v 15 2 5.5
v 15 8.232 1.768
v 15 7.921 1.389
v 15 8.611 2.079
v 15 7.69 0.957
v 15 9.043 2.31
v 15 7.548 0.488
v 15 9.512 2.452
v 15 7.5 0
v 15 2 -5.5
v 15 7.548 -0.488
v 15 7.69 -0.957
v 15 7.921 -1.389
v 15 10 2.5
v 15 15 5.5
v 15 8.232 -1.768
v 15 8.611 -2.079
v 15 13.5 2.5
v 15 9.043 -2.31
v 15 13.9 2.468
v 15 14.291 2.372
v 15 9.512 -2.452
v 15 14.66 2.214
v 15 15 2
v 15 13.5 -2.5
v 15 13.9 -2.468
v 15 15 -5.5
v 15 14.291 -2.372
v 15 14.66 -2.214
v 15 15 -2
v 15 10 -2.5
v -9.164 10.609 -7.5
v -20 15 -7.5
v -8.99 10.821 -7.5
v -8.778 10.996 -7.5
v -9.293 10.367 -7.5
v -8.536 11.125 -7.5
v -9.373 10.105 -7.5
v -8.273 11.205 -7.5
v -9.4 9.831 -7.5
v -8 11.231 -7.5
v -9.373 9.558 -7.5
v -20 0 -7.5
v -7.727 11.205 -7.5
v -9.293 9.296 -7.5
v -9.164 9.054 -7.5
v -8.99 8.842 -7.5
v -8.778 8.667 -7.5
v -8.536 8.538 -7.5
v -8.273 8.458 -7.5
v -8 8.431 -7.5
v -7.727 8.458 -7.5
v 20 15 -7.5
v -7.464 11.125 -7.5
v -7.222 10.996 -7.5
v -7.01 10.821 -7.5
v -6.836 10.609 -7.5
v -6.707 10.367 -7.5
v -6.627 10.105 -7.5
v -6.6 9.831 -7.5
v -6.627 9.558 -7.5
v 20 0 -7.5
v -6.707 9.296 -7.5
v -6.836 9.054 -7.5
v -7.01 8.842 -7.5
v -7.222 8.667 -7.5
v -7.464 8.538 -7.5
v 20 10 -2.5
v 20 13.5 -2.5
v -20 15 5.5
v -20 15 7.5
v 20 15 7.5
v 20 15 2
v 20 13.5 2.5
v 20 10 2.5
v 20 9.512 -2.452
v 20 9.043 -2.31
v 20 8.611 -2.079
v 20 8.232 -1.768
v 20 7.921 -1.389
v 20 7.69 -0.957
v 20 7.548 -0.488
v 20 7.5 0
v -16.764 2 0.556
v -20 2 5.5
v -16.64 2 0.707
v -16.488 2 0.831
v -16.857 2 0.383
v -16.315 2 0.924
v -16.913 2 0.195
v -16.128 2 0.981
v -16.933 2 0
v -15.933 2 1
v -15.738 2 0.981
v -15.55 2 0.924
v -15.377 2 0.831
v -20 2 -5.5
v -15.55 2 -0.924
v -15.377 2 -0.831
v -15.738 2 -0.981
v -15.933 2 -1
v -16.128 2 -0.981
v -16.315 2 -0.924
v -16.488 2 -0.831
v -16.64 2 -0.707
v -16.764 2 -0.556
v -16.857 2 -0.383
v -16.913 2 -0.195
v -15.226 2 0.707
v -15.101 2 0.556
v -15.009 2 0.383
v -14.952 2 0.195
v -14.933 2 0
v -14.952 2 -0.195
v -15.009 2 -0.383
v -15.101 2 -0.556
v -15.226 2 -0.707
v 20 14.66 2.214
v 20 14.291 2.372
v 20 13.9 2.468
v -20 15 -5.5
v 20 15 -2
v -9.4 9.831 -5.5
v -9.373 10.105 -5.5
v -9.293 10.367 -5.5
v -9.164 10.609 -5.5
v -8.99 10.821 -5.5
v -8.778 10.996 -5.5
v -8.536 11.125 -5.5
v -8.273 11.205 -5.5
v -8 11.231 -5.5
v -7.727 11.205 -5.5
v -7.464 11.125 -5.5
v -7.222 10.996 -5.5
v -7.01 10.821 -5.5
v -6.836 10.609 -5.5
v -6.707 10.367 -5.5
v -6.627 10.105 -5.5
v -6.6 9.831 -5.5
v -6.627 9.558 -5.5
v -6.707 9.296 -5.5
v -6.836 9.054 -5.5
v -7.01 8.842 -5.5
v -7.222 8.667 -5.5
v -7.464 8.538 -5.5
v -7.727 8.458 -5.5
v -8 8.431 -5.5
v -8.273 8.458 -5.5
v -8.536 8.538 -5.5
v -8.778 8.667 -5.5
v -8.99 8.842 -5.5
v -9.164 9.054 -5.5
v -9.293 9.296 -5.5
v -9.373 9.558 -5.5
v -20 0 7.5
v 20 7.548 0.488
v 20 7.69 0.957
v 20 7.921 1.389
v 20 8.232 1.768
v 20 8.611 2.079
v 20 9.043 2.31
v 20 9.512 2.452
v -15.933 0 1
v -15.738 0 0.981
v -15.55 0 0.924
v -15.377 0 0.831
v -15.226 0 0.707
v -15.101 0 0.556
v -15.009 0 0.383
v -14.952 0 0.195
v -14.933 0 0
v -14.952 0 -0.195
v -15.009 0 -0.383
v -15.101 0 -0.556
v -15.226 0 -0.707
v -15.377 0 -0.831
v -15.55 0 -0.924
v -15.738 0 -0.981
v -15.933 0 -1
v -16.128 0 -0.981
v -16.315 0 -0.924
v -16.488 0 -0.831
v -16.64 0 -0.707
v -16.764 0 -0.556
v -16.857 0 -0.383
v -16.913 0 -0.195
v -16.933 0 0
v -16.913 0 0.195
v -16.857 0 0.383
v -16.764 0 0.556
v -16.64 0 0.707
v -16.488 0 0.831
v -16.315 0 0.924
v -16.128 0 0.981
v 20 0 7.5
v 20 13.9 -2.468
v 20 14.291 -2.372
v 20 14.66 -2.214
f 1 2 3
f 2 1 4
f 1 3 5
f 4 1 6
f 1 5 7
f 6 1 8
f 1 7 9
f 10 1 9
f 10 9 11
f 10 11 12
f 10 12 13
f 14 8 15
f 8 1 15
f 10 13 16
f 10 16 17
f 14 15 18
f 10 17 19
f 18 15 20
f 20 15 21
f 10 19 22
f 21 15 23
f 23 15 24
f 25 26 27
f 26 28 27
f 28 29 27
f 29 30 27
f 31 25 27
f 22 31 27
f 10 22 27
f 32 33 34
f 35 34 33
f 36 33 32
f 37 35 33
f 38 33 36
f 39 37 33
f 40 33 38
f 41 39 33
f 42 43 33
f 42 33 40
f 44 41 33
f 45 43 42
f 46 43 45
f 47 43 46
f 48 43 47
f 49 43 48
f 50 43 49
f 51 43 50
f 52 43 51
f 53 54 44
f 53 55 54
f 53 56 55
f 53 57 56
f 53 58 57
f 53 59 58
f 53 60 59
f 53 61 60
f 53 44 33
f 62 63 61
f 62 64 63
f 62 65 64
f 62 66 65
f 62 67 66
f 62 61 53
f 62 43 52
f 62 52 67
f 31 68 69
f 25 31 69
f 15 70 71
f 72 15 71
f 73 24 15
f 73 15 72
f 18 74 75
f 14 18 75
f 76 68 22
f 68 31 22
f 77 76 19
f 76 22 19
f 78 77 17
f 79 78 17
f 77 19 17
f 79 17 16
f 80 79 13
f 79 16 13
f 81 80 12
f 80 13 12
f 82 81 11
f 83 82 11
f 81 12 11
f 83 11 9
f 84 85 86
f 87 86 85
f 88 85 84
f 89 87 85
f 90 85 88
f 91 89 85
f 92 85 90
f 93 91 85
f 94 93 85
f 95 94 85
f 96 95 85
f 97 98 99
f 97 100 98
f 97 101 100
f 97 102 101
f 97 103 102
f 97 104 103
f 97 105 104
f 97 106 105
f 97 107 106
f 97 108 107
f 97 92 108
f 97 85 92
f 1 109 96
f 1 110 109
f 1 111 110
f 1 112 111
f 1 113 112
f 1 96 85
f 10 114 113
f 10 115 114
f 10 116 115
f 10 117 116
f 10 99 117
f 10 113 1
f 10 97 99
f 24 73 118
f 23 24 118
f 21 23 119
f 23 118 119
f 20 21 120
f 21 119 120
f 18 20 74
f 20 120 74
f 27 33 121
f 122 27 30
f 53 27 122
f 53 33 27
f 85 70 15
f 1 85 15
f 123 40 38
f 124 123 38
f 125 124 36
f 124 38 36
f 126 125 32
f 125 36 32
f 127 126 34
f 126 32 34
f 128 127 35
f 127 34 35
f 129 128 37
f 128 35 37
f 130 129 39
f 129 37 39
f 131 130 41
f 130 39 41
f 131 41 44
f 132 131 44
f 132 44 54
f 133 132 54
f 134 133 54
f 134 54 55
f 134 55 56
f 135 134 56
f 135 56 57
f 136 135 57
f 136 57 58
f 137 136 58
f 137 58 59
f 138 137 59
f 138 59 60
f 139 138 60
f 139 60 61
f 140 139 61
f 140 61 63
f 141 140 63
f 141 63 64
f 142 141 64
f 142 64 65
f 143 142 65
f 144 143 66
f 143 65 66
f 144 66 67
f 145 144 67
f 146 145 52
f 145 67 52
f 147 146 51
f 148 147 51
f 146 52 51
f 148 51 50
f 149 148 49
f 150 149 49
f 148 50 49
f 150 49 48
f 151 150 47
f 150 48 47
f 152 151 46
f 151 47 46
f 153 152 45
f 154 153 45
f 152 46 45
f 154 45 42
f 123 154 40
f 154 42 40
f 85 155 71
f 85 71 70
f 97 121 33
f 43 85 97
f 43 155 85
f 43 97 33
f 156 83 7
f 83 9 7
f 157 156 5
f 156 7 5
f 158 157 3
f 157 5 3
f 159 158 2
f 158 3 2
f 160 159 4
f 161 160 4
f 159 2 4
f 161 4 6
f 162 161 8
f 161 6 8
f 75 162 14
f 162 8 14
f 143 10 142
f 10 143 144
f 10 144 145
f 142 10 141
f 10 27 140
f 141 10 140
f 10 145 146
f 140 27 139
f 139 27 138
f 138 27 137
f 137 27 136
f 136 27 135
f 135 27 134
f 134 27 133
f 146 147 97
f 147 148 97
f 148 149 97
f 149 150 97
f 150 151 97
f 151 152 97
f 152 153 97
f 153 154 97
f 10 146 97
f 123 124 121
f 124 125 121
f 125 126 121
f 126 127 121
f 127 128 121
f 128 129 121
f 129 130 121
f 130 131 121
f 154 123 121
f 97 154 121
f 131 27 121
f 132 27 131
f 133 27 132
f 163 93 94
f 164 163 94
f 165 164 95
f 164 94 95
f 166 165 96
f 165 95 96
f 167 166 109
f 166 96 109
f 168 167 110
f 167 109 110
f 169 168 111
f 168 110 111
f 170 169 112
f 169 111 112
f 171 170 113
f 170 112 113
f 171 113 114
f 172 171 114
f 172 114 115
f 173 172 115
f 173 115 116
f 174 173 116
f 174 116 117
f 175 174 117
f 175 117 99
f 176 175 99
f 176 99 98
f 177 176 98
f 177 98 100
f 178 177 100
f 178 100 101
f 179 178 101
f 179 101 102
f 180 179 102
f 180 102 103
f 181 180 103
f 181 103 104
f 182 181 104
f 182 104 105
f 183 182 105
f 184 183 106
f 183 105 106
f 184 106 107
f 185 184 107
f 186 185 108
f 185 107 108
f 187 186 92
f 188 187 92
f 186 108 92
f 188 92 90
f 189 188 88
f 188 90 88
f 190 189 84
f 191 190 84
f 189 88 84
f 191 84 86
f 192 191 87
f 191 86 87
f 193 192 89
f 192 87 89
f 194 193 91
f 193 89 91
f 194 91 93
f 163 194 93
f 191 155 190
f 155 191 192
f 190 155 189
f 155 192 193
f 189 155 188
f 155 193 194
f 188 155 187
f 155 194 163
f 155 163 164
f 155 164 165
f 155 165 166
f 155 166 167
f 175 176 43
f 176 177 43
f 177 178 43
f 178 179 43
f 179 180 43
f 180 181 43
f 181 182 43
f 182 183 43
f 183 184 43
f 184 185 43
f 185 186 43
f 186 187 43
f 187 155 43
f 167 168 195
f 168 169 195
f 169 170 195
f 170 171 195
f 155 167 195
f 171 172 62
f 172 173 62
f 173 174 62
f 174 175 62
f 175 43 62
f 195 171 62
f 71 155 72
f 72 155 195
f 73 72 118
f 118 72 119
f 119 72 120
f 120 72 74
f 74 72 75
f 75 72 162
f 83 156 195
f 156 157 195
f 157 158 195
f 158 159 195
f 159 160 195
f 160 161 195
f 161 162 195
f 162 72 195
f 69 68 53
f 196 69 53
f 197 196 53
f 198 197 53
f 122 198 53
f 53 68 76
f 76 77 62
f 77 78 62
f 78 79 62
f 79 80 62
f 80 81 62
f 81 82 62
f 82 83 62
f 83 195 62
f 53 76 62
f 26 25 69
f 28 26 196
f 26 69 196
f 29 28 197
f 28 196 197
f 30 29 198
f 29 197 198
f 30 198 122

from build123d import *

# Parameters (mm, degrees)
SKETCH1_W           = 40
SKETCH1_H           = 15
BOSS_EXTRUDE1_DEPTH = 15
CUT_EXTRUDE1_DEPTH  = 5
CUT_EXTRUDE2_DEPTH  = 13
FILLET3_R           = 2.5
FILLET4_R           = 2.5
SKETCH4_R           = 1.4
CUT_EXTRUDE3_DEPTH  = 8
SKETCH5_R           = 1
CUT_EXTRUDE4_DEPTH  = 10


with BuildPart() as part:
    # Sketch1 → Boss-Extrude1 (new body)
    with BuildSketch(Plane(origin=(0, 0, 0), x_dir=(1, 0, 0), z_dir=(0, 1, 0))):
        Rectangle(SKETCH1_W, SKETCH1_H)
    extrude(amount=BOSS_EXTRUDE1_DEPTH)

    # Sketch2 → Cut-Extrude1 (cut)
    with BuildSketch(Plane(origin=(20, 0, 0), x_dir=(0, 0, -1), z_dir=(1, 0, 0))):
        with BuildLine():
            Line((-2.5, 13.5), (-2.5, 7.5))
            Line((-2.5, 7.5), (2.5, 7.5))
            Line((2.5, 7.5), (2.5, 13.5))
            ThreePointArc((2.5, 13.5), (0, 16), (-2.5, 13.5))
        make_face()
    extrude(amount=-CUT_EXTRUDE1_DEPTH, mode=Mode.SUBTRACT)

    # Sketch3 → Cut-Extrude2 (cut)
    with BuildSketch(Plane(origin=(0, 15, 0), x_dir=(1, 0, 0), z_dir=(0, 1, 0))):
        Polygon((-18, 5.5), (-20, 5.5), (-20, -5.5), (-18, -5.5), (15, -5.5), (15, 2), (15, 5.5), align=None)
    extrude(amount=-CUT_EXTRUDE2_DEPTH, mode=Mode.SUBTRACT)

    # Fillet3
    fillet3_edges = [part.edges().sort_by_distance(p)[0] for p in [
        (17.5, 7.5, -2.5),
    ]]
    fillet(fillet3_edges, radius=FILLET3_R)

    # Fillet4
    fillet4_edges = [part.edges().sort_by_distance(p)[0] for p in [
        (17.5, 7.5, 2.5),
    ]]
    fillet(fillet4_edges, radius=FILLET4_R - 0.0001)  # a hair under: the kernel refuses the full size

    # Sketch4 → Cut-Extrude3 (cut)
    with BuildSketch(Plane(origin=(-14.629961684, 3.541693354, -7.5), x_dir=(-1, 0, 0), z_dir=(0, 0, -1))):
        with Locations((-6.629961684, 6.289794724)):
            Circle(SKETCH4_R)
    extrude(amount=-CUT_EXTRUDE3_DEPTH, mode=Mode.SUBTRACT)

    # Sketch5 → Cut-Extrude4 (cut)
    with BuildSketch(Plane(origin=(0, 2, 0), x_dir=(1, 0, 0), z_dir=(0, 1, 0))):
        with Locations(Location((-15.932700141, 0, 0), (0, 0, 270))):
            Circle(SKETCH5_R)
    extrude(amount=-CUT_EXTRUDE4_DEPTH, mode=Mode.SUBTRACT)


solid = part.part
